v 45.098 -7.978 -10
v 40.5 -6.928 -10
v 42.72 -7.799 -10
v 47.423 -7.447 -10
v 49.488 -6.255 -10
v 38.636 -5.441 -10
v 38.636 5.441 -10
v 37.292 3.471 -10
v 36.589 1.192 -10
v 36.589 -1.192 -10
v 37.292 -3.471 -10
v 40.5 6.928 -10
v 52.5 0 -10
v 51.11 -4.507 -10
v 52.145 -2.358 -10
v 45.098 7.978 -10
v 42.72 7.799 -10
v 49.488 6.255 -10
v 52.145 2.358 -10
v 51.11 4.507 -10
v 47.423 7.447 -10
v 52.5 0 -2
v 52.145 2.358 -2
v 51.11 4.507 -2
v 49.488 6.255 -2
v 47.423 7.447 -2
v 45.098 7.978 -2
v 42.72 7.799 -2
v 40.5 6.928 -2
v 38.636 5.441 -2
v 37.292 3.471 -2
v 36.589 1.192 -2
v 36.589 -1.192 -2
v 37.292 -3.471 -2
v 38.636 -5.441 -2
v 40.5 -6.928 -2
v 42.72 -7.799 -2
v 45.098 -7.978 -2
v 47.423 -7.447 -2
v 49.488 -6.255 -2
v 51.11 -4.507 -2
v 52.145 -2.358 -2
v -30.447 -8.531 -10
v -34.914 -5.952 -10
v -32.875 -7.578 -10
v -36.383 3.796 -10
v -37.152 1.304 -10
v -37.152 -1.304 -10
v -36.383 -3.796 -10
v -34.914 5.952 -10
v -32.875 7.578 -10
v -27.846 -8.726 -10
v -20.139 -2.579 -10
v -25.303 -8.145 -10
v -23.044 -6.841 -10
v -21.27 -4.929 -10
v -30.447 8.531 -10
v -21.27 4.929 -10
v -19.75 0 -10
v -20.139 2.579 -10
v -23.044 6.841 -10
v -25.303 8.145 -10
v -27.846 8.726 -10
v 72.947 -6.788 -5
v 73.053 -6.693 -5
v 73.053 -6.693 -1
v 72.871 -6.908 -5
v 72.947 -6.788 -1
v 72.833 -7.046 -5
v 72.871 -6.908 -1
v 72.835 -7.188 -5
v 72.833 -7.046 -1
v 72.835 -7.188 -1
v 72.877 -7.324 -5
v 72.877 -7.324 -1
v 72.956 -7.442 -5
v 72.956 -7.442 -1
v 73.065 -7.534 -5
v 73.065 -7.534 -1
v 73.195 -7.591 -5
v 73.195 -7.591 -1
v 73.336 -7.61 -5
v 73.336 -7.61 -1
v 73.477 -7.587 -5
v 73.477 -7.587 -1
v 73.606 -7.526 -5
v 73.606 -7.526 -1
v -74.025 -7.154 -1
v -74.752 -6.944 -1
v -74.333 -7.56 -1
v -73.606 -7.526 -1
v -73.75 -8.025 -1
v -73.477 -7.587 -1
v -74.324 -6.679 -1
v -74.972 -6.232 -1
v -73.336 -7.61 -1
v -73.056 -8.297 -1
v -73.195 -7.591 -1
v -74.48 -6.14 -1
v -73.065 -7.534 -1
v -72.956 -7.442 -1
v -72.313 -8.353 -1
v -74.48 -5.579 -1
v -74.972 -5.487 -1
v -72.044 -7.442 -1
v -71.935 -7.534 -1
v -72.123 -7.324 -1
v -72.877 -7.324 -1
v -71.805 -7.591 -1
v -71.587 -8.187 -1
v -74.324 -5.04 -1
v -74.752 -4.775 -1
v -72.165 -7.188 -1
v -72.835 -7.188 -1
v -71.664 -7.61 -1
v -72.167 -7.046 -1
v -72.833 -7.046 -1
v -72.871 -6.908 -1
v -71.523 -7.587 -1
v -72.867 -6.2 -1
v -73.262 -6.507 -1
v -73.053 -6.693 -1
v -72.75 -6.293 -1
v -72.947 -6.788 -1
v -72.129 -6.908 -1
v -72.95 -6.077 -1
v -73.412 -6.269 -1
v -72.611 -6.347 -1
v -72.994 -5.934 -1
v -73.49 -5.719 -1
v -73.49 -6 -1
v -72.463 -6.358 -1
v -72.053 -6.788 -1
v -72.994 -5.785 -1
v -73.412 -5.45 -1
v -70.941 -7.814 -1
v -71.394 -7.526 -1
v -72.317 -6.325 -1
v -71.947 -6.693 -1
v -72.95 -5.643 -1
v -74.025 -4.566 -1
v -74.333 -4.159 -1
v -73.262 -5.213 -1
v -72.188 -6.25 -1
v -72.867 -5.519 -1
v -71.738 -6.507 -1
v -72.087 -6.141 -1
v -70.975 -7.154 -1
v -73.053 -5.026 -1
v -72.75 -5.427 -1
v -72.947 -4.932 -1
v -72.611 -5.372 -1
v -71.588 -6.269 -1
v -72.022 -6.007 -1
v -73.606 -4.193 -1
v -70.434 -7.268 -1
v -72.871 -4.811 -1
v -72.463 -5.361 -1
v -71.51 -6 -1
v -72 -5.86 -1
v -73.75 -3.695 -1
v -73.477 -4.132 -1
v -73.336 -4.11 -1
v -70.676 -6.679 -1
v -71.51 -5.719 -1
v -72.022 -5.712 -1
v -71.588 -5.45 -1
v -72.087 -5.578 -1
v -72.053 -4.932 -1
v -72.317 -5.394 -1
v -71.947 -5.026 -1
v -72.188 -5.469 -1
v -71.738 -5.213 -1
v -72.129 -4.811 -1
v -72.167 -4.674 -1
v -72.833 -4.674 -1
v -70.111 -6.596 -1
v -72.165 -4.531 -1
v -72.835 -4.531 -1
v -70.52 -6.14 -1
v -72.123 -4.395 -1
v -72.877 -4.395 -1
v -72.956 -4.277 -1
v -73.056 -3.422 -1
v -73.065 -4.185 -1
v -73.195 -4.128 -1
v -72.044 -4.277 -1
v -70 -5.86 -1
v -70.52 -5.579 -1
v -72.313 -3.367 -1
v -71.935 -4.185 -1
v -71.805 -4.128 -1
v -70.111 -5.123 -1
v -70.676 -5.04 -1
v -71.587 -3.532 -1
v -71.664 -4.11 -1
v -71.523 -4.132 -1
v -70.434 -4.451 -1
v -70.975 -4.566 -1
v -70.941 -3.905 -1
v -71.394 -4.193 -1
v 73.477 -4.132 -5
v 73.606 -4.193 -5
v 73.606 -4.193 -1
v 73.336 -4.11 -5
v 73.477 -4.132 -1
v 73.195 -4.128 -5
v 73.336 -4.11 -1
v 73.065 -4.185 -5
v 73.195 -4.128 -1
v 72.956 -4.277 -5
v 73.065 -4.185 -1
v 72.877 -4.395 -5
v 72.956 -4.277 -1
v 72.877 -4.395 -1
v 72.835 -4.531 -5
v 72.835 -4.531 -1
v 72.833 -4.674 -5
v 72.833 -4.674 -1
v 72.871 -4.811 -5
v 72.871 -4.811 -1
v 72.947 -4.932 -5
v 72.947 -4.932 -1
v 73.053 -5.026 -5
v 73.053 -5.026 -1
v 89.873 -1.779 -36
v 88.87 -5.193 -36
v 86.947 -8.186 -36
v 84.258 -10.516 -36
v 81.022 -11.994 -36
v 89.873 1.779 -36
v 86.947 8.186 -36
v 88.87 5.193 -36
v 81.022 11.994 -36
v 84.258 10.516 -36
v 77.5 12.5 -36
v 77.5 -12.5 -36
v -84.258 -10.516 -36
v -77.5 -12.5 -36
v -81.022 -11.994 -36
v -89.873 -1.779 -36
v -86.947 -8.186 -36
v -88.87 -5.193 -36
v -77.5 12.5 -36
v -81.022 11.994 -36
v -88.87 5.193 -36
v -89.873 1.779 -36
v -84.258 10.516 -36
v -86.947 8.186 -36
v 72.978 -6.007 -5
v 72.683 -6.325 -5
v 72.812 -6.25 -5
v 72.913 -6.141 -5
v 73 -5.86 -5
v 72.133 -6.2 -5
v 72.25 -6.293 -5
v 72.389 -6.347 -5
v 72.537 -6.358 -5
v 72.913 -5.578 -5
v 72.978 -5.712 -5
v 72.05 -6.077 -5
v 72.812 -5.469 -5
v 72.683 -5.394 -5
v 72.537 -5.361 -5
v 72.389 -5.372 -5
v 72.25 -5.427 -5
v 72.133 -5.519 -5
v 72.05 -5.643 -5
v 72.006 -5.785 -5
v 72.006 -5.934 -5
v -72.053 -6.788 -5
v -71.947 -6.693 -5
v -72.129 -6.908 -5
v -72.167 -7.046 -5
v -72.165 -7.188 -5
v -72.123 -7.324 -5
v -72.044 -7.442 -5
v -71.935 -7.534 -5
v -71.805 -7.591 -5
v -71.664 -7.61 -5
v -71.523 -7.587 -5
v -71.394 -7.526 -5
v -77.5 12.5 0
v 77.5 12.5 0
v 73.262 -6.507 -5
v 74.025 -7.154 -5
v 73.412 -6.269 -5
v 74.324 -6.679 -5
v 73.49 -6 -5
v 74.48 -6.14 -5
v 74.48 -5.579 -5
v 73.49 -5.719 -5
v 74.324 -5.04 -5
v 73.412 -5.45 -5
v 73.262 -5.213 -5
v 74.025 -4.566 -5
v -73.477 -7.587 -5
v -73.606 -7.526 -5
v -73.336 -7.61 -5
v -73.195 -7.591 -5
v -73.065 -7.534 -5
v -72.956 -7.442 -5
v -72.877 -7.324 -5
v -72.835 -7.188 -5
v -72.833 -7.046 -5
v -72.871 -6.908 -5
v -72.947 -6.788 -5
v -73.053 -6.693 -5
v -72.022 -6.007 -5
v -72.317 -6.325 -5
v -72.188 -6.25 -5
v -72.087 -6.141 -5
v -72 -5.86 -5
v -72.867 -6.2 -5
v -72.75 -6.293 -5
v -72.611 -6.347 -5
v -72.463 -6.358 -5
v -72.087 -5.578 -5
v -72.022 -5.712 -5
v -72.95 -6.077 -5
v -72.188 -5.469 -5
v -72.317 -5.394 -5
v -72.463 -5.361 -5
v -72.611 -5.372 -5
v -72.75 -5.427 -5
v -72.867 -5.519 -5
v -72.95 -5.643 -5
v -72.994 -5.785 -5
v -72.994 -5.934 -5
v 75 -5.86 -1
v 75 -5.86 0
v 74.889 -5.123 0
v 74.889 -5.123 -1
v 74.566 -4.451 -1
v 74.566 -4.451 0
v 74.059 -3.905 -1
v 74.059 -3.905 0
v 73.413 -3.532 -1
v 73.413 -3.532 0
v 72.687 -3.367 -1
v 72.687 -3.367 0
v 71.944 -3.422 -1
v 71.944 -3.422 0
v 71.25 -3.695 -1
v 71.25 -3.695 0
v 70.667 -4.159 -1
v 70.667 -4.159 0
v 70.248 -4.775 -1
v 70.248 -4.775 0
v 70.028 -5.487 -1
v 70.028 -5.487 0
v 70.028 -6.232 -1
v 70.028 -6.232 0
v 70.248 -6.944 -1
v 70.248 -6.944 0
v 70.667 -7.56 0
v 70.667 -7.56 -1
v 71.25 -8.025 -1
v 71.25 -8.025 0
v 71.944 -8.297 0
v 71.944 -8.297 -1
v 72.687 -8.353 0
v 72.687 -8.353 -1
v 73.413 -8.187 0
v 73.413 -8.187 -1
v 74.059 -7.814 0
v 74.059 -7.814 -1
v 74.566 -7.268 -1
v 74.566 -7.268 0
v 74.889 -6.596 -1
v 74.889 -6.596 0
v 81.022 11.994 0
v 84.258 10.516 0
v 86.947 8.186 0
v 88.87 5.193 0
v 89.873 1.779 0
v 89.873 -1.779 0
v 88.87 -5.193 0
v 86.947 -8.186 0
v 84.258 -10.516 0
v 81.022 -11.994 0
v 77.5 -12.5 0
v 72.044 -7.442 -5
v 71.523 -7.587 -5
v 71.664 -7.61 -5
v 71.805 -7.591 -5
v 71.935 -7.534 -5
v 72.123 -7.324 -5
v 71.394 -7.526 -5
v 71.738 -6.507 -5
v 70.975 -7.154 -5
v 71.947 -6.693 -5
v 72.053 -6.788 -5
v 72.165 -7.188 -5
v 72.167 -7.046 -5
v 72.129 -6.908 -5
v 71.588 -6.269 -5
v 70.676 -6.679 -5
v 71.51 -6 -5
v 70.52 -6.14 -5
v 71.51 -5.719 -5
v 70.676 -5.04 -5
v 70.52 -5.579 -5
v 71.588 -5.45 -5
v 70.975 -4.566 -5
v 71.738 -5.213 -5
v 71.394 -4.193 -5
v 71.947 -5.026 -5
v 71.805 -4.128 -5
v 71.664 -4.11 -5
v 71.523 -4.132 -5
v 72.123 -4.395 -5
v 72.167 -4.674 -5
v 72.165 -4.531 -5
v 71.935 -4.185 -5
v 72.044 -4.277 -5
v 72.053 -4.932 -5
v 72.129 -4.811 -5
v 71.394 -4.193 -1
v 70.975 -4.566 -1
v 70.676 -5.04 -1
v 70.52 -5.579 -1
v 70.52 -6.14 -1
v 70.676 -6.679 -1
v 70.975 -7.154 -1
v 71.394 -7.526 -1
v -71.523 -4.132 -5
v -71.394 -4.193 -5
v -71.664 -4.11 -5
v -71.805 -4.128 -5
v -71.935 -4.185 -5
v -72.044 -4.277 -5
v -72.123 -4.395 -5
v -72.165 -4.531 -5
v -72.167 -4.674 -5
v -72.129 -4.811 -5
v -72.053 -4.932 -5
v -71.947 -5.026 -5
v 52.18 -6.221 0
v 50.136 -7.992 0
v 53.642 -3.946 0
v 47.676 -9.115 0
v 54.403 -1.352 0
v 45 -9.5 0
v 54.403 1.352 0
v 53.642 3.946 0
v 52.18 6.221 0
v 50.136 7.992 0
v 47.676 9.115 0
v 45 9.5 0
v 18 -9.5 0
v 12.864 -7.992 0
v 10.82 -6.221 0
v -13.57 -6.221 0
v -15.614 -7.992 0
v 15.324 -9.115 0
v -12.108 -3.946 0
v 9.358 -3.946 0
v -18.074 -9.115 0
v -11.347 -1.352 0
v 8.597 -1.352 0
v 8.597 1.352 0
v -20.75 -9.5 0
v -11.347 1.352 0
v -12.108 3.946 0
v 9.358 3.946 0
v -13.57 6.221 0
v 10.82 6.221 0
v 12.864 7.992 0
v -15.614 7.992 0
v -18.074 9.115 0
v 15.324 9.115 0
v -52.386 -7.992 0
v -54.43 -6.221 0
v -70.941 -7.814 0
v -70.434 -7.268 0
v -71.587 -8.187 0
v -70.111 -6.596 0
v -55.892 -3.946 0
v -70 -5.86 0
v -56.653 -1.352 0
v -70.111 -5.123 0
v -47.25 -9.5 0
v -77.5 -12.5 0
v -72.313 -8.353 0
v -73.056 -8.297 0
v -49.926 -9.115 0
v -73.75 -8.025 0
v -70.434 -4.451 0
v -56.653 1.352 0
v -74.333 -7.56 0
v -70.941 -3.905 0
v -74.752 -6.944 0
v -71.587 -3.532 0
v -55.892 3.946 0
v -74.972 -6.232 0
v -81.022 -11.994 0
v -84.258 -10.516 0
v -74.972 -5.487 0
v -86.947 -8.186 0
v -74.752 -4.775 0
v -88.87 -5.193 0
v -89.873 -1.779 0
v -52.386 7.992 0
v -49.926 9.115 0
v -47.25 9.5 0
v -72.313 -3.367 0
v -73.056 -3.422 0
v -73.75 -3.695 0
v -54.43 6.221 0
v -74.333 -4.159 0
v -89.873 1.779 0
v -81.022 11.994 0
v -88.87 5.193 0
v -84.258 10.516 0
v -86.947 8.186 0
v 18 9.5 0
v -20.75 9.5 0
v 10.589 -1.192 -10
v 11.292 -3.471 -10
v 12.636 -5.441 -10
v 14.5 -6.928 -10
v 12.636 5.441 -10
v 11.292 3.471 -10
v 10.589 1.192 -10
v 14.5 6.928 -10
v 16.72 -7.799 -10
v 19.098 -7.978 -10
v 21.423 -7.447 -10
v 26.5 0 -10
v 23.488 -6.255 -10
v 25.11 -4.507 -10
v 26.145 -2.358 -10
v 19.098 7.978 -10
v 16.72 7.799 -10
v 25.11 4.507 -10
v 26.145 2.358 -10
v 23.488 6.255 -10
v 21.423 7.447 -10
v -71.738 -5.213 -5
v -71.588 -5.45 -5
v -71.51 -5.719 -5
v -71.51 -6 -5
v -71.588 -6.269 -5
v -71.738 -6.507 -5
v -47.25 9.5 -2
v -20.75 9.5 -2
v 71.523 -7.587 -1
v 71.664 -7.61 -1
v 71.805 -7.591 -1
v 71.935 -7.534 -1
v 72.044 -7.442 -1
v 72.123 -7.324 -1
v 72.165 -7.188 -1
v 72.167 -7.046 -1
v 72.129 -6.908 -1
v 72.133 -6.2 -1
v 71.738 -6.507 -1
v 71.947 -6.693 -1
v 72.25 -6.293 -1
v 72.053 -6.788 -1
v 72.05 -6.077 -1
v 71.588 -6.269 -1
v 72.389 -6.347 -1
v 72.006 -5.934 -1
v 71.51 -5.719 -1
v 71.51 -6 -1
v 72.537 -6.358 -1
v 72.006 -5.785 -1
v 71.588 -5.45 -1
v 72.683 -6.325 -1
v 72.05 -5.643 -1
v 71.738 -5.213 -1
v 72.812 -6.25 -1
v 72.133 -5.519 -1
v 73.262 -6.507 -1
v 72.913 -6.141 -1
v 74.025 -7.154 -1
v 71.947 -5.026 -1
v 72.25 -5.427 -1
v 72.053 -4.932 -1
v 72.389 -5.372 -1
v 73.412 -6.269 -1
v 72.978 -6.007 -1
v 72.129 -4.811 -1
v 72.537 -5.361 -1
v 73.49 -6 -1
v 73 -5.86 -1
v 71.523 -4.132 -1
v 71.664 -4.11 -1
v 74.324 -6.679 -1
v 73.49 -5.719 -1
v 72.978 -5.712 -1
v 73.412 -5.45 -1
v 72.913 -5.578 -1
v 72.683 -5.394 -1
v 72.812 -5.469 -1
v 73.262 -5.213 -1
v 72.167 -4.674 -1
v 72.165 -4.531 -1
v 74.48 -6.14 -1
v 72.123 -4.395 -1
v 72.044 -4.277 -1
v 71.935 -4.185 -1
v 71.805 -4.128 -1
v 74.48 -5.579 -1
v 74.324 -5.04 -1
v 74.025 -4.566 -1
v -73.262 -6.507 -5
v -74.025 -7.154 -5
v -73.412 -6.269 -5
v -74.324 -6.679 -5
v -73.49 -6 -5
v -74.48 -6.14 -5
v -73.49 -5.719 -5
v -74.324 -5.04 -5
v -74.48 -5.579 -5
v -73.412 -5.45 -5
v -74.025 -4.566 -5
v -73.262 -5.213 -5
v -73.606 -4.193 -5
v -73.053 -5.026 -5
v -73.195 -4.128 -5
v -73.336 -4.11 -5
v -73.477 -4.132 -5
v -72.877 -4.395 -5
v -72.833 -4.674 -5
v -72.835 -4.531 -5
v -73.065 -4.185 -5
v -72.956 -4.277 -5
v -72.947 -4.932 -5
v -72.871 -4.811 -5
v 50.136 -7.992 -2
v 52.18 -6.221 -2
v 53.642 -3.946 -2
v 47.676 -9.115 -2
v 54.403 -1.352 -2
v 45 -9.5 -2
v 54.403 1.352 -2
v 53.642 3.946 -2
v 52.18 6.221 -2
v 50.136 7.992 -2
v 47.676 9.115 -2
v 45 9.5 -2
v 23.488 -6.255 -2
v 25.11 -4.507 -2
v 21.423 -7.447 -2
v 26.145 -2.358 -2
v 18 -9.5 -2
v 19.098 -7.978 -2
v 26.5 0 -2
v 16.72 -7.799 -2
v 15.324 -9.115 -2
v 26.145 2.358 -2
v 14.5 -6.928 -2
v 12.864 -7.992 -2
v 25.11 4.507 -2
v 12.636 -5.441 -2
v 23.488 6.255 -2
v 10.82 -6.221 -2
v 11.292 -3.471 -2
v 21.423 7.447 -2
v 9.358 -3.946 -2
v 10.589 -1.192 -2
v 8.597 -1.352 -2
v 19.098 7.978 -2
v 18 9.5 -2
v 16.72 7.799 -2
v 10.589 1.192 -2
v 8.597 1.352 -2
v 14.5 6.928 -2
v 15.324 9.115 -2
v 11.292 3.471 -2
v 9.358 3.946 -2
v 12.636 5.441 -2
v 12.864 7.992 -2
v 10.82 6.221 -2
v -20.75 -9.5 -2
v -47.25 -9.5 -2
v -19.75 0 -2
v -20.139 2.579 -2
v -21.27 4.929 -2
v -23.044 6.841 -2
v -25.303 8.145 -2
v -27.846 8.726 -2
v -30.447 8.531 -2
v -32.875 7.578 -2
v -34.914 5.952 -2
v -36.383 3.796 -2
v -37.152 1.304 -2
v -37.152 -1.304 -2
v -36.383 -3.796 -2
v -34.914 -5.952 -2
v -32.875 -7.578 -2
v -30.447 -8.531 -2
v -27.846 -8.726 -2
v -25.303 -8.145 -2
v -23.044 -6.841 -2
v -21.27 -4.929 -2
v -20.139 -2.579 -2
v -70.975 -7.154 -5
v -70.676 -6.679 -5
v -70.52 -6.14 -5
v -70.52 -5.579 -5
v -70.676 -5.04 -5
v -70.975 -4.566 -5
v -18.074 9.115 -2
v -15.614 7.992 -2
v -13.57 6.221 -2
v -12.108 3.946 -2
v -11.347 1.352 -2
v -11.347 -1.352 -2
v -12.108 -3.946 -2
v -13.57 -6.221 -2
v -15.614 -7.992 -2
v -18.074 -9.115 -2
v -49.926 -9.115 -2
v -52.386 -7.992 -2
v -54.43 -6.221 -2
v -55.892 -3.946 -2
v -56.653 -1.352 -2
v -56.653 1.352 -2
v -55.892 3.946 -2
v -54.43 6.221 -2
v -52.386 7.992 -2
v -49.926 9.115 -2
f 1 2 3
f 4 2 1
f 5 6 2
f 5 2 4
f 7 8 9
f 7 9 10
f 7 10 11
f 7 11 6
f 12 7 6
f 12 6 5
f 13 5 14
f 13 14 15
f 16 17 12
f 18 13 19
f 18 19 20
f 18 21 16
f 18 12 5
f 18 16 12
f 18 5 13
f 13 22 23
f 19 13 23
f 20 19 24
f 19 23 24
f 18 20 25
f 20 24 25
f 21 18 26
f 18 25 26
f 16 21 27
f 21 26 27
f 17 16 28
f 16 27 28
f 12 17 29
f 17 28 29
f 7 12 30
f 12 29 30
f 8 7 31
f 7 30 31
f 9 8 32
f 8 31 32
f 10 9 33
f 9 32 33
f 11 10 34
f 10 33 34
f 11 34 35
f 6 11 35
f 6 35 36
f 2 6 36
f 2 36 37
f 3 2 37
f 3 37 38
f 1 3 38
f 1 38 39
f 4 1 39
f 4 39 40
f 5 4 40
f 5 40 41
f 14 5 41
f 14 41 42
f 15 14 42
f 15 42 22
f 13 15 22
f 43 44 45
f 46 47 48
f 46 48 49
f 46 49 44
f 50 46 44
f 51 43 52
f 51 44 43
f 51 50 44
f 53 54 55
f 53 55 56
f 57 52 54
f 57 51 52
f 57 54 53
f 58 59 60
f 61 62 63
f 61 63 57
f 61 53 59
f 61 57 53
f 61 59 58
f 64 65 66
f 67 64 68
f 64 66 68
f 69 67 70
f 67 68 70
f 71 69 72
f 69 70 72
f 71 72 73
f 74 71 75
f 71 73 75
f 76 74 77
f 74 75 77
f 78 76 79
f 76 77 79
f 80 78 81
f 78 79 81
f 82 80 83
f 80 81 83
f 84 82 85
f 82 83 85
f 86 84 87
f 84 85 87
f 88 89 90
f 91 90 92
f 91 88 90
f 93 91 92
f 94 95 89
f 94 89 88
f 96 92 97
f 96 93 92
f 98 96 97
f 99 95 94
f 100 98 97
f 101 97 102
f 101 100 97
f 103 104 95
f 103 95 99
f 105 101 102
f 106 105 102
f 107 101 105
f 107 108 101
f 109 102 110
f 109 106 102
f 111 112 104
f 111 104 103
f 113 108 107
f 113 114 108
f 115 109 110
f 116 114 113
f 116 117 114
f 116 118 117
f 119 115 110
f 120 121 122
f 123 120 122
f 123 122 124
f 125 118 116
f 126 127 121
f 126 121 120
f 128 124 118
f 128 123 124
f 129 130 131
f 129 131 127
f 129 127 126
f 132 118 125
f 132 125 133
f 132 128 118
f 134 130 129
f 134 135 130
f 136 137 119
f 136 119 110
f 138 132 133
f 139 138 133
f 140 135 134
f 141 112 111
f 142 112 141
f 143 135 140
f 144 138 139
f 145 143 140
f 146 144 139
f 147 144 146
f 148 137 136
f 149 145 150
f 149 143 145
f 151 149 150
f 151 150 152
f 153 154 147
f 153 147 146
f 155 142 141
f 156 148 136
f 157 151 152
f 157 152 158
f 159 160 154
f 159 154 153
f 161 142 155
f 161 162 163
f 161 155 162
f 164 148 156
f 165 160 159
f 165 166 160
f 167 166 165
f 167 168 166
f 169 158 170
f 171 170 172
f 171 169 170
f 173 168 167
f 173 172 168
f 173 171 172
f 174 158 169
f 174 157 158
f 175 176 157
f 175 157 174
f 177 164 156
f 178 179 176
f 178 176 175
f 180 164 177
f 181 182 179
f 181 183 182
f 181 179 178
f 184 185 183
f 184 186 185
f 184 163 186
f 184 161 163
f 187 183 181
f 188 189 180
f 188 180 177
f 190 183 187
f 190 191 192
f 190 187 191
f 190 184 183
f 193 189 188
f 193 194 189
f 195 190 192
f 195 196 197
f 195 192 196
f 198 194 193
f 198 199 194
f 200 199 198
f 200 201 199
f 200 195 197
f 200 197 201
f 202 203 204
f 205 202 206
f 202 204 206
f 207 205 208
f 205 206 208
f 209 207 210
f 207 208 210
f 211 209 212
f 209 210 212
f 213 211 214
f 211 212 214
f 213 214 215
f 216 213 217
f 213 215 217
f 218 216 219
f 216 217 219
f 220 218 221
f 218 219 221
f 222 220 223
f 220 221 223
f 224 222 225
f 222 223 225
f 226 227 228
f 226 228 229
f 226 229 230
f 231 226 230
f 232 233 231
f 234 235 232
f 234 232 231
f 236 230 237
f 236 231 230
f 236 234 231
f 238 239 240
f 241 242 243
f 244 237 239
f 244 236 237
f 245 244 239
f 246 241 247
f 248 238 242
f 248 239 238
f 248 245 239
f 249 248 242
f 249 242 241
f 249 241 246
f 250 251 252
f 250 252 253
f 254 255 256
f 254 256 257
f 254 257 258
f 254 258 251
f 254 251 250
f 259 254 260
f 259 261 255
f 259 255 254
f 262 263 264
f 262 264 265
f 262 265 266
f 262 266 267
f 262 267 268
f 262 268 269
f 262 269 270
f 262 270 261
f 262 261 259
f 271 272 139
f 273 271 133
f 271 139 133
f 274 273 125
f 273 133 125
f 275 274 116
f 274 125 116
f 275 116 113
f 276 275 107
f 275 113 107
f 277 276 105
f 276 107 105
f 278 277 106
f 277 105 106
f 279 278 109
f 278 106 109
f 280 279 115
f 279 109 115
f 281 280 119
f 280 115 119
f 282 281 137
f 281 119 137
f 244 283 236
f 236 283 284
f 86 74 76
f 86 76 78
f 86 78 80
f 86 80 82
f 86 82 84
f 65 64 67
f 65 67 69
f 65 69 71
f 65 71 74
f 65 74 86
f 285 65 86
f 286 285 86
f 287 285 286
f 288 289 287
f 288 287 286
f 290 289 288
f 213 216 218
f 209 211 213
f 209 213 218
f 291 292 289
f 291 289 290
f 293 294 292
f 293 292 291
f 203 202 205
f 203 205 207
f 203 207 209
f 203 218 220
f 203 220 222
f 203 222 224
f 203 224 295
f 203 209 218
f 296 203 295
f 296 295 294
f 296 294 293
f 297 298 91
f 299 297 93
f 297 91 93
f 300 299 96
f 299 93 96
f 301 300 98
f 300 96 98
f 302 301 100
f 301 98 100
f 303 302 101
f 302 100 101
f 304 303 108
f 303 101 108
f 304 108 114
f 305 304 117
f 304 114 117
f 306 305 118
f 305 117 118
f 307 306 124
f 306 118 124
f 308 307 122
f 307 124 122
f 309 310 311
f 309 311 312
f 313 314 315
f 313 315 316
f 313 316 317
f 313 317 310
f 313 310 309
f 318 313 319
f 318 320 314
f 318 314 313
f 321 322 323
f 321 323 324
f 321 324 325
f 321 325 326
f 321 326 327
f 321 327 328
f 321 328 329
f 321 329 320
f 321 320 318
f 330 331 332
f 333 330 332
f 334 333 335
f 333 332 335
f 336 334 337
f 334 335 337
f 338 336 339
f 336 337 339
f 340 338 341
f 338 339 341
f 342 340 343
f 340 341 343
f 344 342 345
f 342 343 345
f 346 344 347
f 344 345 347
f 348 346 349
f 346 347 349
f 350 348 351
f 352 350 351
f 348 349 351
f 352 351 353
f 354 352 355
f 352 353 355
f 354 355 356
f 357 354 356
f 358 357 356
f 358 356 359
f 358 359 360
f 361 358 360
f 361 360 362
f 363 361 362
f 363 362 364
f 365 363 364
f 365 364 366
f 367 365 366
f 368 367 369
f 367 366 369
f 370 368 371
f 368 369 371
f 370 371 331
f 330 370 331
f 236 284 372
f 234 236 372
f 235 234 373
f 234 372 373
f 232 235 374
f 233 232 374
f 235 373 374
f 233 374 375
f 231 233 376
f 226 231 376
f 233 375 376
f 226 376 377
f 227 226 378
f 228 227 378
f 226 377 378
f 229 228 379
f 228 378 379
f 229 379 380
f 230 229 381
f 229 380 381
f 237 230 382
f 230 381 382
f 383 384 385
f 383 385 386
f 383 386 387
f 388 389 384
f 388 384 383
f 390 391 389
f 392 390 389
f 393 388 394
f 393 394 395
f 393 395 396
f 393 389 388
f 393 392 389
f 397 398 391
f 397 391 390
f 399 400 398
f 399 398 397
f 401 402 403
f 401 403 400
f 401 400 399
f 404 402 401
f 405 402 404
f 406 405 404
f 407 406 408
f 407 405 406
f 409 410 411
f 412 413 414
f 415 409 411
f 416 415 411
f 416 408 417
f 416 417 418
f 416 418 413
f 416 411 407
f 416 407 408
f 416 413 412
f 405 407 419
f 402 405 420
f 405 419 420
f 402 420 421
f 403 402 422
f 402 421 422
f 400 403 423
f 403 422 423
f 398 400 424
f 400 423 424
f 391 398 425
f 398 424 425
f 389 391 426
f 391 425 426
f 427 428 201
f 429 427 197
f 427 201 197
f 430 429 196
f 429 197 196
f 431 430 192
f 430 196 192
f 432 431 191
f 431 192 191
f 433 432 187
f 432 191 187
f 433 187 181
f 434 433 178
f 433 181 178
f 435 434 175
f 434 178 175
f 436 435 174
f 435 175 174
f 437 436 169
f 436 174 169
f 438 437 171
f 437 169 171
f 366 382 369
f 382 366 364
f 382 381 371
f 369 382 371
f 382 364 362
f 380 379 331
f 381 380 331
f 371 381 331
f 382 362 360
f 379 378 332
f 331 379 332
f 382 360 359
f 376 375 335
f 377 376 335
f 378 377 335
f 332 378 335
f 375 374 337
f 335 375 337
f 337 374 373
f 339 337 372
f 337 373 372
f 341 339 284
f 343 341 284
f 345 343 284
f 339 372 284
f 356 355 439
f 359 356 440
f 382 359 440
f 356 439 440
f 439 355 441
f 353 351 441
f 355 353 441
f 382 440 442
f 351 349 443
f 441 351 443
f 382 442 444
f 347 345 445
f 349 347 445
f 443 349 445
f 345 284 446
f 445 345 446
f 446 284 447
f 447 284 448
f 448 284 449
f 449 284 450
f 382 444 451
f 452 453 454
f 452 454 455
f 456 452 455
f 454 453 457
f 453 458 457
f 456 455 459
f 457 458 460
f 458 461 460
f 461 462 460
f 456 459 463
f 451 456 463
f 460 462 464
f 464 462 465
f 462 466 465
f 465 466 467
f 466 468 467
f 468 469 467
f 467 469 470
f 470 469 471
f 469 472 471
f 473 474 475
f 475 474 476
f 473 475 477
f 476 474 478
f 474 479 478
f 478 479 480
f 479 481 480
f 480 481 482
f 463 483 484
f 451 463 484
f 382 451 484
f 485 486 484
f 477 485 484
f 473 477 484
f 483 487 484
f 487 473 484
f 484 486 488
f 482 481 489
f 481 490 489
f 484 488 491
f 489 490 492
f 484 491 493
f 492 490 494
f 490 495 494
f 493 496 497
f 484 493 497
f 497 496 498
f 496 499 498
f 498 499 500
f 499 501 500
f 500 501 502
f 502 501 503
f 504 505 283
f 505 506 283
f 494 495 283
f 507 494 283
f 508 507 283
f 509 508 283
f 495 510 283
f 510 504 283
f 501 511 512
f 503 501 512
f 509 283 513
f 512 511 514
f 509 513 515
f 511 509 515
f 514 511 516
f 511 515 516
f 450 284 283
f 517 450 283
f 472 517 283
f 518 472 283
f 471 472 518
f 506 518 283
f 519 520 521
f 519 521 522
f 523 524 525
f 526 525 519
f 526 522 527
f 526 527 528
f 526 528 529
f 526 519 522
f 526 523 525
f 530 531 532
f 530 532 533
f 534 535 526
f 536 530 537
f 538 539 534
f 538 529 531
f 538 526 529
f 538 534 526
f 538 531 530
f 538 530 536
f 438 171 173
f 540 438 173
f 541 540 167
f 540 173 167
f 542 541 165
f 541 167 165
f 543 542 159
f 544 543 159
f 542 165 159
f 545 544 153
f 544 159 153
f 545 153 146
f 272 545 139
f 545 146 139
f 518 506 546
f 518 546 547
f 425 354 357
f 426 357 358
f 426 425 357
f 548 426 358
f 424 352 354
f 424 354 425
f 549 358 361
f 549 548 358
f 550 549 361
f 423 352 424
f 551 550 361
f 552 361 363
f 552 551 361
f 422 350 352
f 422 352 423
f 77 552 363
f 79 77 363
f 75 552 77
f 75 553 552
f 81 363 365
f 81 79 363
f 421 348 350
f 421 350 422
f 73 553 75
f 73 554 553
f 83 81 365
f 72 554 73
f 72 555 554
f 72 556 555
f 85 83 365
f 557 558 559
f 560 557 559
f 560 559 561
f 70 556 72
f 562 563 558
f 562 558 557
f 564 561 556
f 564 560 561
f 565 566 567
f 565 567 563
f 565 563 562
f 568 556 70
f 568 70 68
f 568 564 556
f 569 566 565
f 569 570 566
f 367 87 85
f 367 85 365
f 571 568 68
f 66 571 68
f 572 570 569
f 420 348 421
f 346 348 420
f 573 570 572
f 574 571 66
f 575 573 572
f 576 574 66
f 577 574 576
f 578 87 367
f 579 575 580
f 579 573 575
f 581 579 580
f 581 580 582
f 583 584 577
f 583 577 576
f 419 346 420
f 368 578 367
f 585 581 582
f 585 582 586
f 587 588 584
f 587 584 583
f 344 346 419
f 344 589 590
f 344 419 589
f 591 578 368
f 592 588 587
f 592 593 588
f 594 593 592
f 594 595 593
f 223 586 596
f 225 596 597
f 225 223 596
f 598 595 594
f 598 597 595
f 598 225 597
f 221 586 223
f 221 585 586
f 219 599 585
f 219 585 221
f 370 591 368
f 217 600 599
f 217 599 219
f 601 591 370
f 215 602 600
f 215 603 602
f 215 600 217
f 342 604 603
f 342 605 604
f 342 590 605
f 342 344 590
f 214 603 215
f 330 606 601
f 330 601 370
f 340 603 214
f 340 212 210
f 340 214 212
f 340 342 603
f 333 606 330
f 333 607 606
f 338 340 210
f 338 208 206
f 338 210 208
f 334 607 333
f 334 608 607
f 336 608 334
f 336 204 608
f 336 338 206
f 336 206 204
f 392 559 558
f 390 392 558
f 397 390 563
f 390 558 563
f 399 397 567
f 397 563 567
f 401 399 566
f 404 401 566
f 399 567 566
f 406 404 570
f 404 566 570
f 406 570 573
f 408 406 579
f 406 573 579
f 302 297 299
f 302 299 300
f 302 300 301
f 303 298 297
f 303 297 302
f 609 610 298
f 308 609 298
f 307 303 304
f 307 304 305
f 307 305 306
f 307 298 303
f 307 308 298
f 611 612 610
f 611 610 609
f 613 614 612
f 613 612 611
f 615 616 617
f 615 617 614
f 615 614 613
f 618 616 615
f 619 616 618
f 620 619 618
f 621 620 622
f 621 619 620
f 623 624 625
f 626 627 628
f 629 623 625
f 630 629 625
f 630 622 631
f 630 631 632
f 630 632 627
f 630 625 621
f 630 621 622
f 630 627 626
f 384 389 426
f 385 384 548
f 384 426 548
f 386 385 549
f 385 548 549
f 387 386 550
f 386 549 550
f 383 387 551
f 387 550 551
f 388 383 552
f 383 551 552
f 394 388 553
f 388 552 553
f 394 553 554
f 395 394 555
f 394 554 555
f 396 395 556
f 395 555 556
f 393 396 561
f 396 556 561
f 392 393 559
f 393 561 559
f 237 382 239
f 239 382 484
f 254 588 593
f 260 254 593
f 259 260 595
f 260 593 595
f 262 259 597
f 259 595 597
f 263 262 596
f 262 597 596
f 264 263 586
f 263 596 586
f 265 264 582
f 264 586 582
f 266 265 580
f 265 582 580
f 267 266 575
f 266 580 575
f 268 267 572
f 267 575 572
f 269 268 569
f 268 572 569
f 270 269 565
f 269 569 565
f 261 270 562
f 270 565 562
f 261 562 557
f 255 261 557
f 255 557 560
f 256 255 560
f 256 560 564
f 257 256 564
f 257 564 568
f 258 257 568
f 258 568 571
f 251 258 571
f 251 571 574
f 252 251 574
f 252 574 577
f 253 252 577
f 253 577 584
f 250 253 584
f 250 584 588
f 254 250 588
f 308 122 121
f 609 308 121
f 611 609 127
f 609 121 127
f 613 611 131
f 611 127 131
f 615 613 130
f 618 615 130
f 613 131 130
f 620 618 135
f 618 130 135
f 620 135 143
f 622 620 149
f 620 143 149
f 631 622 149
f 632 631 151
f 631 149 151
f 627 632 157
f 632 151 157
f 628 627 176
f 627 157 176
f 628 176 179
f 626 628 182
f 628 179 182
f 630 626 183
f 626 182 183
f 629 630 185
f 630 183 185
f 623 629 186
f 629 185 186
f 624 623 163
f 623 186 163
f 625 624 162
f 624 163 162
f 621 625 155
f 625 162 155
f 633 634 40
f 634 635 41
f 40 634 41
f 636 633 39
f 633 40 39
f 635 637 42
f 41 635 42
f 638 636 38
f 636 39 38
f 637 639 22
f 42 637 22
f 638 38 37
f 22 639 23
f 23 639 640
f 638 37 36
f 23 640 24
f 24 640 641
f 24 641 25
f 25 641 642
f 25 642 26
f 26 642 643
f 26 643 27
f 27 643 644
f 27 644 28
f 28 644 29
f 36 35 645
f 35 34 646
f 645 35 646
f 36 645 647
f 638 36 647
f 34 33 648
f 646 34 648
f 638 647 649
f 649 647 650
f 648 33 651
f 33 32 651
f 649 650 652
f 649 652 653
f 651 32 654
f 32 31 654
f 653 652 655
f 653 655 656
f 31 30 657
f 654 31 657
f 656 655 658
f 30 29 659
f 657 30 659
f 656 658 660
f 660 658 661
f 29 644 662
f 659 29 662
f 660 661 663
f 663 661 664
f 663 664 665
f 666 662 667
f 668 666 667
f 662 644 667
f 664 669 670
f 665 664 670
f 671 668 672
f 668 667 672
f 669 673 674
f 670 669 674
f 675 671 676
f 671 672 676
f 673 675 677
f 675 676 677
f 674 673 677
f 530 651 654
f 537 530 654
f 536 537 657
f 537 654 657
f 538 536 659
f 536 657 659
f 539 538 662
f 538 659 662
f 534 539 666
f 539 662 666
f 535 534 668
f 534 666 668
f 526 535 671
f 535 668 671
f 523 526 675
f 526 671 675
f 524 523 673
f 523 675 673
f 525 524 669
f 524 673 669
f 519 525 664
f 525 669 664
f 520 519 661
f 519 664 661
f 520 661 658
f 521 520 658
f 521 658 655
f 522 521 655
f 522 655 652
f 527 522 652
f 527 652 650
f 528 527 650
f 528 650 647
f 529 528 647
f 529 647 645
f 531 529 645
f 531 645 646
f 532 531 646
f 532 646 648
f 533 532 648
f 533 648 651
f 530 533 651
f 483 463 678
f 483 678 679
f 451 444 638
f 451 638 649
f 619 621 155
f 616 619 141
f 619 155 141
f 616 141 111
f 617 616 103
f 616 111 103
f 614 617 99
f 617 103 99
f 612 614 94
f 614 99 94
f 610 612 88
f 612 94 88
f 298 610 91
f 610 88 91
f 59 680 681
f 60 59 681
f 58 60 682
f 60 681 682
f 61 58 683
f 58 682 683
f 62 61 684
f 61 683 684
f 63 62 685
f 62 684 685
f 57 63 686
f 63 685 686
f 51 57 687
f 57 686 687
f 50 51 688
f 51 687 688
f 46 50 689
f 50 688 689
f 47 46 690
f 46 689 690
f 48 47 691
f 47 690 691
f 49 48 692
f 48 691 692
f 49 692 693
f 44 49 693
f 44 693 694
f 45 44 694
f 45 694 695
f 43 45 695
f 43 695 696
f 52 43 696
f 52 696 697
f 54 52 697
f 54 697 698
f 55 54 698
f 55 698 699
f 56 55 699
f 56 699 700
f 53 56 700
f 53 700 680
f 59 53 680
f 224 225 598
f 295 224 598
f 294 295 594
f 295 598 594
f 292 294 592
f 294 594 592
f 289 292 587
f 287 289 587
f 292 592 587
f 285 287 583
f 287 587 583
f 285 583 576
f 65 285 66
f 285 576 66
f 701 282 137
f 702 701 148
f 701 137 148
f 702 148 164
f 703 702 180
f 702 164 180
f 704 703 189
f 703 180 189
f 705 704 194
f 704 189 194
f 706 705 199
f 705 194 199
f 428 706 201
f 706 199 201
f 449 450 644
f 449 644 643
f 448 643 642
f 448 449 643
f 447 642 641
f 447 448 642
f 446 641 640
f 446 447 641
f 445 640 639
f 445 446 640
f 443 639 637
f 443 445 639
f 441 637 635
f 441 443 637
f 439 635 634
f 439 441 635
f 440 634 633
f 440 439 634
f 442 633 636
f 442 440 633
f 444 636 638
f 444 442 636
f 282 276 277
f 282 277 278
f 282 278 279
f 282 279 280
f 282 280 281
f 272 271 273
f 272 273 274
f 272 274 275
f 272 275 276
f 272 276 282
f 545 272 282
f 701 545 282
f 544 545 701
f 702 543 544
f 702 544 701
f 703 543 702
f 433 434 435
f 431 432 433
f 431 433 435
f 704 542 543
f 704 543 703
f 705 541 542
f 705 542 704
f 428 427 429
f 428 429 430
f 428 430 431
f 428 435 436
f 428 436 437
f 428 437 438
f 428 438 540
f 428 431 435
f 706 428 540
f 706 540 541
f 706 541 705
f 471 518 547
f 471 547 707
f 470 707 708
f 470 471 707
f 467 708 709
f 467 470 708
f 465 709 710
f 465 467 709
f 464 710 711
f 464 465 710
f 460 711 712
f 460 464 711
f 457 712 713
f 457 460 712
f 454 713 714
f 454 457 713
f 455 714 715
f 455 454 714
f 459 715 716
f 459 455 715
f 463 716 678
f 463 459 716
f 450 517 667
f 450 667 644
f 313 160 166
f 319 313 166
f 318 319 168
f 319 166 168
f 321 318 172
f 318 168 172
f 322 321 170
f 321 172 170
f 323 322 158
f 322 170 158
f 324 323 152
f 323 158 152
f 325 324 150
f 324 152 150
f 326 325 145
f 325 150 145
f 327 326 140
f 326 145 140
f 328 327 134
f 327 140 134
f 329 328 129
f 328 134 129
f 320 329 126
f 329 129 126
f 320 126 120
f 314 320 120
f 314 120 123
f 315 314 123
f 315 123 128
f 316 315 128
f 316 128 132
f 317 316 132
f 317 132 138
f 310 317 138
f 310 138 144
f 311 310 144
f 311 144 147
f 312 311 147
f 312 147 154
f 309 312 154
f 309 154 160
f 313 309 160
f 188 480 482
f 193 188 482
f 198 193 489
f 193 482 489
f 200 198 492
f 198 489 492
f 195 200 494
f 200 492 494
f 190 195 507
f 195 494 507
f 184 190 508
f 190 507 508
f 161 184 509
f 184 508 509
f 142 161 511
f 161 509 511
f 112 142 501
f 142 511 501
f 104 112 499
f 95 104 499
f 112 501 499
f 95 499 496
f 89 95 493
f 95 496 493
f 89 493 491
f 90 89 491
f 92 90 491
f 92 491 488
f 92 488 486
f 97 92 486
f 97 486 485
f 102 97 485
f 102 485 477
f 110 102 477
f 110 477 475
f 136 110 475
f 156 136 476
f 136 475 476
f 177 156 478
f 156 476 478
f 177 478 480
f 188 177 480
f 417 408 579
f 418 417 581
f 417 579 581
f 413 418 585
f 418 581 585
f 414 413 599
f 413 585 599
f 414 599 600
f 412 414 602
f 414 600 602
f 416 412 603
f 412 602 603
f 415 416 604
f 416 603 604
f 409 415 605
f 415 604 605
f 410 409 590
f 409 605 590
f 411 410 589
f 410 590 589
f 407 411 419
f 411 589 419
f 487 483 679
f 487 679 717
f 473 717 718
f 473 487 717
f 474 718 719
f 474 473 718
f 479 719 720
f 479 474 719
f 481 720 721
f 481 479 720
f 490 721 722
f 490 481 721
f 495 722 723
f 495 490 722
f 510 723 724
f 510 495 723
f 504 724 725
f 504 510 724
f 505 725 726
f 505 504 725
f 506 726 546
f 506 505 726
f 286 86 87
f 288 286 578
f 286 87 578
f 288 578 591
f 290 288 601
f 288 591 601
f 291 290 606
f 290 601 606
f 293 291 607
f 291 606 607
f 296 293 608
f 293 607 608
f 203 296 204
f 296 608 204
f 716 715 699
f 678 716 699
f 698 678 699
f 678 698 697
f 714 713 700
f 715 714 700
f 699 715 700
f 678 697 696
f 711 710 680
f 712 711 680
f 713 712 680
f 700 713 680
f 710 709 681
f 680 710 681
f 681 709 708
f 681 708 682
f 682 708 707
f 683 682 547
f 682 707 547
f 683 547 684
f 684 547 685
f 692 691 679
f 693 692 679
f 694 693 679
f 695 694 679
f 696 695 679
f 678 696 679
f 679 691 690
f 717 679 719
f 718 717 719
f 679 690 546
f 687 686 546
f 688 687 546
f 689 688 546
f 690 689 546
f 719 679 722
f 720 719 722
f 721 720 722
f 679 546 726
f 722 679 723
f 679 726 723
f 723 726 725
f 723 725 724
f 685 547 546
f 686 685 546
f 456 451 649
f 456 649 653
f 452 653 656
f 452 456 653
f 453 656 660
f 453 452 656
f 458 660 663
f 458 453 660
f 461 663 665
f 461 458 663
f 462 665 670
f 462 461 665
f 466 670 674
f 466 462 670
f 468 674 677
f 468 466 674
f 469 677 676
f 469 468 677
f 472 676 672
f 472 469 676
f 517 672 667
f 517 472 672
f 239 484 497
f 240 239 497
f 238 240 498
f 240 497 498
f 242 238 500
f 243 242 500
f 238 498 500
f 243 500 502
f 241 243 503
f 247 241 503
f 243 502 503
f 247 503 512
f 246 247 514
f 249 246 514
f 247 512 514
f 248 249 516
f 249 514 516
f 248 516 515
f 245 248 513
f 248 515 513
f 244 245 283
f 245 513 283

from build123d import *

# Parameters (mm, degrees)
BOSS_EXTRUDE1_DEPTH = 36
SKETCH3_R           = 8.75
SKETCH3_R_2         = 8
CUT_EXTRUDE1_DEPTH  = 10
CUT_EXTRUDE2_DEPTH  = 2
SKETCH5_R           = 2.5
CUT_EXTRUDE3_DEPTH  = 1
SKETCH6_R           = 0.5
CUT_EXTRUDE4_DEPTH  = 5


with BuildPart() as part:
    # Sketch1 → Boss-Extrude1 (new body)
    with BuildSketch(Plane.XY):
        with BuildLine():
            Line((-77.5, 12.5), (77.5, 12.5))
            ThreePointArc((77.5, 12.5), (90, 0), (77.5, -12.5))
            Line((77.5, -12.5), (-77.5, -12.5))
            ThreePointArc((-77.5, -12.5), (-90, 0), (-77.5, 12.5))
        make_face()
    extrude(amount=-BOSS_EXTRUDE1_DEPTH)

    # Sketch3 → Cut-Extrude1 (cut)
    with BuildSketch(Plane.XY):
        with Locations((-28.5, 0)):
            Circle(SKETCH3_R)
        with Locations((18.5, 0)):
            Circle(SKETCH3_R_2)
        with Locations((44.5, 0)):
            Circle(SKETCH3_R_2)
    extrude(amount=-CUT_EXTRUDE1_DEPTH, mode=Mode.SUBTRACT)

    # Sketch4 → Cut-Extrude2 (cut)
    with BuildSketch(Plane.XY):
        with BuildLine():
            Line((-47.25, 9.5), (-20.75, 9.5))
            ThreePointArc((-20.75, 9.5), (-11.25, 0), (-20.75, -9.5))
            Line((-20.75, -9.5), (-47.25, -9.5))
            ThreePointArc((-47.25, -9.5), (-56.75, 0), (-47.25, 9.5))
        make_face()
        with BuildLine():
            Line((18, 9.5), (45, 9.5))
            ThreePointArc((45, 9.5), (54.5, 0), (45, -9.5))
            Line((45, -9.5), (18, -9.5))
            ThreePointArc((18, -9.5), (8.5, 0), (18, 9.5))
        make_face()
    extrude(amount=-CUT_EXTRUDE2_DEPTH, mode=Mode.SUBTRACT)

    # Sketch5 → Cut-Extrude3 (cut)
    with BuildSketch(Plane.XY):
        with Locations((72.5, -5.85958214)):
            Circle(SKETCH5_R)
        with Locations((-72.5, -5.85958214)):
            Circle(SKETCH5_R)
    extrude(amount=-CUT_EXTRUDE3_DEPTH, mode=Mode.SUBTRACT)

    # Sketch6 → Cut-Extrude4 (cut)
    with BuildSketch(Plane.XY):
        with Locations((-72.5, -5.85958214)):
            Circle(SKETCH6_R)
        with Locations((72.5, -5.85958214)):
            Circle(SKETCH6_R)
        with BuildLine():
            ThreePointArc((-71.394458403, -7.526248807), (-70.5, -5.85958214), (-71.394458403, -4.192915474))
            ThreePointArc((-71.394458403, -4.192915474), (-72.087510469, -4.333196741), (-71.947229202, -5.026248807))
            ThreePointArc((-71.947229202, -5.026248807), (-71.5, -5.85958214), (-71.947229202, -6.692915474))
            ThreePointArc((-71.947229202, -6.692915474), (-72.087510469, -7.385967539), (-71.394458403, -7.526248807))
        make_face()
        with BuildLine():
            ThreePointArc((-73.605541597, -4.192915474), (-74.5, -5.85958214), (-73.605541597, -7.526248807))
            ThreePointArc((-73.605541597, -7.526248807), (-72.912489531, -7.385967539), (-73.052770798, -6.692915474))
            ThreePointArc((-73.052770798, -6.692915474), (-73.5, -5.85958214), (-73.052770798, -5.026248807))
            ThreePointArc((-73.052770798, -5.026248807), (-72.912489531, -4.333196741), (-73.605541597, -4.192915474))
        make_face()
        with BuildLine():
            ThreePointArc((73.605541597, -7.526248807), (74.5, -5.85958214), (73.605541597, -4.192915474))
            ThreePointArc((73.605541597, -4.192915474), (72.912489531, -4.333196741), (73.052770798, -5.026248807))
            ThreePointArc((73.052770798, -5.026248807), (73.5, -5.85958214), (73.052770798, -6.692915474))
            ThreePointArc((73.052770798, -6.692915474), (72.912489531, -7.385967539), (73.605541597, -7.526248807))
        make_face()
        with BuildLine():
            ThreePointArc((71.394458403, -4.192915474), (70.5, -5.85958214), (71.394458403, -7.526248807))
            ThreePointArc((71.394458403, -7.526248807), (72.087510469, -7.385967539), (71.947229202, -6.692915474))
            ThreePointArc((71.947229202, -6.692915474), (71.5, -5.85958214), (71.947229202, -5.026248807))
            ThreePointArc((71.947229202, -5.026248807), (72.087510469, -4.333196741), (71.394458403, -4.192915474))
        make_face()
    extrude(amount=-CUT_EXTRUDE4_DEPTH, mode=Mode.SUBTRACT)


solid = part.part
